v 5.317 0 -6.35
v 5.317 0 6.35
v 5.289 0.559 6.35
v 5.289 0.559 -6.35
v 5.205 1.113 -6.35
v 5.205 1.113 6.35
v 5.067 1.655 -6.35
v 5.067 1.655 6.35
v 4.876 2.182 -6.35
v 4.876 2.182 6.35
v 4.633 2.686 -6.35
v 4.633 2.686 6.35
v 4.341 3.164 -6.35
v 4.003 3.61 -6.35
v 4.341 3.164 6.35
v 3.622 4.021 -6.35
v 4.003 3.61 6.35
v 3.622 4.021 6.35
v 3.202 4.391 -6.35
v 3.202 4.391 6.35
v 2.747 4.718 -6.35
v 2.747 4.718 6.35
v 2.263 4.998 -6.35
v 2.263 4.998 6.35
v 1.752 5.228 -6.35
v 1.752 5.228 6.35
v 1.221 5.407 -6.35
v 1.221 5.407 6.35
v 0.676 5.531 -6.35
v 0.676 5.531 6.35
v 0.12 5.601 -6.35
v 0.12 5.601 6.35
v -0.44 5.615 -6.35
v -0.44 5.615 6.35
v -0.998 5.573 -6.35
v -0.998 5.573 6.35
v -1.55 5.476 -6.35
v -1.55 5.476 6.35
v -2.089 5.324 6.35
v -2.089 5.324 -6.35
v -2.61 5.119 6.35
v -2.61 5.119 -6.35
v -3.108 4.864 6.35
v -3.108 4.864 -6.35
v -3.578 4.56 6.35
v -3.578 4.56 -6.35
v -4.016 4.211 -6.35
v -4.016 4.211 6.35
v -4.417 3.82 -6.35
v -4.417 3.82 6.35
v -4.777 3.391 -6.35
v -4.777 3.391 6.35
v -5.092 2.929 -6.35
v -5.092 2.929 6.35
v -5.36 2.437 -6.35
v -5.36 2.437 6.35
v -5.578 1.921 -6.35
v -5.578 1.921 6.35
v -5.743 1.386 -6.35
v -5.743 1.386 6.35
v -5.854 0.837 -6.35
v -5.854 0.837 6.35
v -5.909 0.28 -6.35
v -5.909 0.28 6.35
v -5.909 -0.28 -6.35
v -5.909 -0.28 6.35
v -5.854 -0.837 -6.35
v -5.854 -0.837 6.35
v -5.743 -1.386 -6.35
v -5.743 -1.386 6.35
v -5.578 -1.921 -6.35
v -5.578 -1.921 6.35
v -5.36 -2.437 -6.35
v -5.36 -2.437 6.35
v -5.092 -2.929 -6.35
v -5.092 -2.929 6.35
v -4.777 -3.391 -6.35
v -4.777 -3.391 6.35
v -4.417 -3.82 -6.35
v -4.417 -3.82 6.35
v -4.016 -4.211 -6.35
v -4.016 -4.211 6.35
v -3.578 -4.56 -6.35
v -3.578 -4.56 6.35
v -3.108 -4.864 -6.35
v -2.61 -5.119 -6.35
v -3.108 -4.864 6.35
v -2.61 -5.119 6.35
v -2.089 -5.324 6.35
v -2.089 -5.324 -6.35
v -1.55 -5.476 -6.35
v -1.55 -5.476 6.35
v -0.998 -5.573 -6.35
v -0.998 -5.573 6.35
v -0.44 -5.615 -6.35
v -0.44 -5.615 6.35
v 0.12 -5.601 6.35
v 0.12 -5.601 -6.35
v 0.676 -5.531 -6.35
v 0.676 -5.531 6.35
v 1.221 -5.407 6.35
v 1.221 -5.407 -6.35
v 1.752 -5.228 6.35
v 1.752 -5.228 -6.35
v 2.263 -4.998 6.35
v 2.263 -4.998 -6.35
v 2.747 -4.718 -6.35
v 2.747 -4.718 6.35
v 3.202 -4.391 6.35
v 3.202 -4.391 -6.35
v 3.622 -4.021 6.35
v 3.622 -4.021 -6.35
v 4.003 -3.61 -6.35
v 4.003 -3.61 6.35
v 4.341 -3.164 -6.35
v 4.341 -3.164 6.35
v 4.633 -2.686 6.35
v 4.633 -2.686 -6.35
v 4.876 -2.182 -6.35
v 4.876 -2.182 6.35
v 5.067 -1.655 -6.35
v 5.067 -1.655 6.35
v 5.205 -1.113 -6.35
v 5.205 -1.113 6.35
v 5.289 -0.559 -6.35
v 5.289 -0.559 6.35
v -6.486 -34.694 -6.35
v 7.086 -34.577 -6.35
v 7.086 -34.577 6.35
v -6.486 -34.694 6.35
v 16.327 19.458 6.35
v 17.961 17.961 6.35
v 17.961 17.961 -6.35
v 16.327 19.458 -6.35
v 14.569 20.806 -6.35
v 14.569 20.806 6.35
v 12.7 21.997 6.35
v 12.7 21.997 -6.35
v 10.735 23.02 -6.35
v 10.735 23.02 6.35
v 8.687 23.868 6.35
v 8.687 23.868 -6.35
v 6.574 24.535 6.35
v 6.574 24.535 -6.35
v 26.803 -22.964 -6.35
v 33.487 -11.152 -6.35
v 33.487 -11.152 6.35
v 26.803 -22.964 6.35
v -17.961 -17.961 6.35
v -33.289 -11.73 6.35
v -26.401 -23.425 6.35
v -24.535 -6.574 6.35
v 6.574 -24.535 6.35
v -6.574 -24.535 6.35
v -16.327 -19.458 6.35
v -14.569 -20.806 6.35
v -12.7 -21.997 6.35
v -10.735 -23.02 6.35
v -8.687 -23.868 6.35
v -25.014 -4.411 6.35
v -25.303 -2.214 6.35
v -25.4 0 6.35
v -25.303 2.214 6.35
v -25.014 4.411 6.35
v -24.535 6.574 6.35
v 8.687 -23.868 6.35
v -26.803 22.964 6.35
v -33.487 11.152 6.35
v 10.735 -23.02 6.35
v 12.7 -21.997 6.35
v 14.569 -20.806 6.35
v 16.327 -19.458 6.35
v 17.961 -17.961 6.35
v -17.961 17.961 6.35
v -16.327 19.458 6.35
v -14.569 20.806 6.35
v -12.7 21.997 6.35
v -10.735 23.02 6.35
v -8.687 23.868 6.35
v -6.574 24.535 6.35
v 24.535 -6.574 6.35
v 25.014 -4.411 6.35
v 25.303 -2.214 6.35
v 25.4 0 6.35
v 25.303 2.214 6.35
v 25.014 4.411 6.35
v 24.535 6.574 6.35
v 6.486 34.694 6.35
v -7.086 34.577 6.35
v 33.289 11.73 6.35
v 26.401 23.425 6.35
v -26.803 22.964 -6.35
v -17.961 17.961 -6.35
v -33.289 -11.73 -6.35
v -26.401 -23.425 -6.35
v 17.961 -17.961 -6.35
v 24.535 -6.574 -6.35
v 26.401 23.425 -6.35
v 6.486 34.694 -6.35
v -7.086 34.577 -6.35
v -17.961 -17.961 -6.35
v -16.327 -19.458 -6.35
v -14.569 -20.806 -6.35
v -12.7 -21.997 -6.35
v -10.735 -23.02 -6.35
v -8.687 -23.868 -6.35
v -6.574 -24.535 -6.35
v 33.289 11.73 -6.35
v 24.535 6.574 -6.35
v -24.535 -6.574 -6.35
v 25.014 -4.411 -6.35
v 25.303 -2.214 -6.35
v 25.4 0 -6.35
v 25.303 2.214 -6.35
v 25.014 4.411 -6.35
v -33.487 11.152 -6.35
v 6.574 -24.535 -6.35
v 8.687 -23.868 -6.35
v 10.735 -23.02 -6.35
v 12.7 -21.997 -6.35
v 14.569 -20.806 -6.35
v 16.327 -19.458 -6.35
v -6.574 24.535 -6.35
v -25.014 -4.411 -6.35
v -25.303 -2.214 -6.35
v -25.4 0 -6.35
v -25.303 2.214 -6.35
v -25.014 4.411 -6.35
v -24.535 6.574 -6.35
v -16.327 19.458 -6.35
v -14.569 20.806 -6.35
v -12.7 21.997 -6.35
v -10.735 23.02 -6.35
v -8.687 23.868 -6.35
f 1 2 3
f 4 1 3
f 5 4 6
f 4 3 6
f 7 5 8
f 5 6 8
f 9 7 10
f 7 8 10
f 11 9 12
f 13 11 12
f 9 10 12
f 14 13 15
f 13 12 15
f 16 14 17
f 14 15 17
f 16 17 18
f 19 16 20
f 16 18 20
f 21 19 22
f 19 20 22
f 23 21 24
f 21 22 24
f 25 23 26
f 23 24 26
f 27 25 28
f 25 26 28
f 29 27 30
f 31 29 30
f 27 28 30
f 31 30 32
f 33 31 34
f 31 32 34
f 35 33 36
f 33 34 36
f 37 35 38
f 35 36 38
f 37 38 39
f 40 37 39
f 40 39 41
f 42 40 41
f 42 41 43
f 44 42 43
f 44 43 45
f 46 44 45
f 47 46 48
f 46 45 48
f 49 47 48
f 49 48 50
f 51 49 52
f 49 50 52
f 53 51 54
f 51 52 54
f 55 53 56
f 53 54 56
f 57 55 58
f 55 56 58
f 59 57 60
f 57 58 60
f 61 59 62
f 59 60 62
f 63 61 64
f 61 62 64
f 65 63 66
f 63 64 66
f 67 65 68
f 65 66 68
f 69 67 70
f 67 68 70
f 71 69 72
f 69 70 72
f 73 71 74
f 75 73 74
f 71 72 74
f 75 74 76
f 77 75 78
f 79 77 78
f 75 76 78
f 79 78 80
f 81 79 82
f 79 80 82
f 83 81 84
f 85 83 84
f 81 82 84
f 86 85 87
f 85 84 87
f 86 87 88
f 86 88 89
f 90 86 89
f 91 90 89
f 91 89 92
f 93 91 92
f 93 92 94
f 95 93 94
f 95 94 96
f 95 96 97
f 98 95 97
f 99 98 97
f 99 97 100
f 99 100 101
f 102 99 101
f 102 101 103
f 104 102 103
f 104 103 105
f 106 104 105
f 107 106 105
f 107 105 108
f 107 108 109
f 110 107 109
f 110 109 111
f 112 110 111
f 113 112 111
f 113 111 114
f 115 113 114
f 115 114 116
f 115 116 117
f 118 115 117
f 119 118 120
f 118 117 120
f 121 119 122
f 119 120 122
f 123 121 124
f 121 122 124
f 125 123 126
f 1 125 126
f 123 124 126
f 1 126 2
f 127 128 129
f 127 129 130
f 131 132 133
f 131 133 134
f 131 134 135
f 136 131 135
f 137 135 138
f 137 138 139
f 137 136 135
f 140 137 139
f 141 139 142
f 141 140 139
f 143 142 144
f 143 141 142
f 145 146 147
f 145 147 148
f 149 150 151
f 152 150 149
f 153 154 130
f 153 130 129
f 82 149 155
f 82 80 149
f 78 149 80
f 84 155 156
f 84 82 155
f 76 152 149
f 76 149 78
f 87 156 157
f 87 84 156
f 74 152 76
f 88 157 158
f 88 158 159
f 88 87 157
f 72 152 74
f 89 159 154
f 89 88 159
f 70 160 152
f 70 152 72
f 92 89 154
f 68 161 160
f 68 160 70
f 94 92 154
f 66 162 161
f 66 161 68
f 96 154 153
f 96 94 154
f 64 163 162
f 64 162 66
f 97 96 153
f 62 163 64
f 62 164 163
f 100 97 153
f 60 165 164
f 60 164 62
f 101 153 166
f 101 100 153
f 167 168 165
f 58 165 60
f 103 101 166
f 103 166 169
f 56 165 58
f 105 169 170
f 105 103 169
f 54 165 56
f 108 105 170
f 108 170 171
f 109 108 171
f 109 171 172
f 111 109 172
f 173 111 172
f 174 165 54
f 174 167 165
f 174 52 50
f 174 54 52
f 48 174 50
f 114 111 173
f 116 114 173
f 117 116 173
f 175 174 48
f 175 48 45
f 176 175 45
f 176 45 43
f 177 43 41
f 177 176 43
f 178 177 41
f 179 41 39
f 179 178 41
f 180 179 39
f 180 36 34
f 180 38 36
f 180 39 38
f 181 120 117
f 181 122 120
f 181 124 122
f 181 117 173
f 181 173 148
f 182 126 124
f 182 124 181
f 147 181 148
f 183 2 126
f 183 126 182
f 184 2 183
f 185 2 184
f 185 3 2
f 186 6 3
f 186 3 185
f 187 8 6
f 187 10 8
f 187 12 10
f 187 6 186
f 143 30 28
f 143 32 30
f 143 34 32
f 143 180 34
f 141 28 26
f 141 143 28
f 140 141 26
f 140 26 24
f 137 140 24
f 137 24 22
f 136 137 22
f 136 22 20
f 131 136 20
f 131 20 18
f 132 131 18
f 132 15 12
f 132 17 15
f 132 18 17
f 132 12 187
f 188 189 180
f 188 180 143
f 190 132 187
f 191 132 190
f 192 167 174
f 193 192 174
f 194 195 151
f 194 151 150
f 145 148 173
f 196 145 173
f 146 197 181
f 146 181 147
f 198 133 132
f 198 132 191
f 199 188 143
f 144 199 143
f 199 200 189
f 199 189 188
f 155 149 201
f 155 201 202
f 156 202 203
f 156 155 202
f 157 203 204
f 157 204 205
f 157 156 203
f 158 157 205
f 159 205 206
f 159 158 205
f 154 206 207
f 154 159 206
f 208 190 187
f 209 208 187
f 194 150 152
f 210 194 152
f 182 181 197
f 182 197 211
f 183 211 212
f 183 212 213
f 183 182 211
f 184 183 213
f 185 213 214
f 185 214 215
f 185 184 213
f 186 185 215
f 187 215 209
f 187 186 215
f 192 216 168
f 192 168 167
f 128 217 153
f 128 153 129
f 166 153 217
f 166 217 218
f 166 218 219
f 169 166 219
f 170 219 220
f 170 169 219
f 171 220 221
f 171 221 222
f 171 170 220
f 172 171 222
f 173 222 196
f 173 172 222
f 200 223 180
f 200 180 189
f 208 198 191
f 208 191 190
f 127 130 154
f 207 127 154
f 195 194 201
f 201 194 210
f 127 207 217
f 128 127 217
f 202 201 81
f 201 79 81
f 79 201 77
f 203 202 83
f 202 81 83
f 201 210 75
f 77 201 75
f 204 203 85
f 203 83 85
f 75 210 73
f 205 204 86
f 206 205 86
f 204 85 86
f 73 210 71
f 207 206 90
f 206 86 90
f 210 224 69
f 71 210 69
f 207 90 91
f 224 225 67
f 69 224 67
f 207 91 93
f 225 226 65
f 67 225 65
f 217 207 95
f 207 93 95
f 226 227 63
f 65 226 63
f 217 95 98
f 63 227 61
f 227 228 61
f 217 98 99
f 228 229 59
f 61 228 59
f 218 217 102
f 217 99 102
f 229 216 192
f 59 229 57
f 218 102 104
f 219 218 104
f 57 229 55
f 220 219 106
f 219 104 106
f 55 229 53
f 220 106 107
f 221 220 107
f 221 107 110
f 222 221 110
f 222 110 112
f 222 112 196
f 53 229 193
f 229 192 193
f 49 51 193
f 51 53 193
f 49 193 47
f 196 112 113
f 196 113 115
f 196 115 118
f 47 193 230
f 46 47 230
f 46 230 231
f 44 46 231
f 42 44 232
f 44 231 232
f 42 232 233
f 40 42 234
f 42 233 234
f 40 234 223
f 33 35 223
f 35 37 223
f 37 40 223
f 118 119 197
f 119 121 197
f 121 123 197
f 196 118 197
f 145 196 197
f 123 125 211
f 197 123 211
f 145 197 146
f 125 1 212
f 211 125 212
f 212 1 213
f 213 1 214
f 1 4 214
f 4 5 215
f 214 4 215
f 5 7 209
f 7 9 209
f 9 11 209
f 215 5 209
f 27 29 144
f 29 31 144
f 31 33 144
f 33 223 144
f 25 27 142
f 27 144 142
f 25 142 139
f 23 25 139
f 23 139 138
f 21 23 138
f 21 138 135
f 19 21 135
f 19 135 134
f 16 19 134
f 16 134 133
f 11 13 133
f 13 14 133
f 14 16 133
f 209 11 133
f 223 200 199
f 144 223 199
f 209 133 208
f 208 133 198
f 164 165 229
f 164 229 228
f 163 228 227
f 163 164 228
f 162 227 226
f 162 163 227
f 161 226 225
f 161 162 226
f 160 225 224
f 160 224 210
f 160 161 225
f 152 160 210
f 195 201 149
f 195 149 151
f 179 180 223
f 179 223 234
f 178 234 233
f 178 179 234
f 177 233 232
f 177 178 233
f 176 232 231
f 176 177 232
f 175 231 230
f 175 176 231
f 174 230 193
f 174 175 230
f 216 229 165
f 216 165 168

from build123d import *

# Parameters (mm, degrees)
F0_R     = 25.4
F1_DEPTH = 6.35
F3_DEPTH = 12.7
F5_COUNT = 6
F6_R     = 5.616515
F7_DEPTH = 12.7


with BuildPart() as f1:
    # F0 (on Top) → F1 (new body, symmetric)
    with BuildSketch(Plane.XY):
        Circle(F0_R)
    extrude(amount=F1_DEPTH, both=True)

    # F2 (on face) → F3 (join)
    with BuildSketch(Plane(origin=(0, 0, -6.35), x_dir=(1, 0, 0), z_dir=(0, 0, -1))):
        with BuildLine():
            Line((-6.574004, 24.534516), (0, 24.477616))
            Line((0, 24.477616), (0, 25.4))
            ThreePointArc((0, 25.4), (-3.315365, 25.182699), (-6.574004, 24.534516))
        make_face()
        with BuildLine():
            Line((0, 25.4), (0, 24.477616))
            Line((0, 24.477616), (6.543582, 24.420979))
            Line((6.543582, 24.420979), (6.574004, 24.534516))
            ThreePointArc((6.574004, 24.534516), (3.315365, 25.182699), (0, 25.4))
        make_face()
        with BuildLine():
            Line((-6.486069, 34.694135), (-6.574004, 24.534516))
            ThreePointArc((-6.574004, 24.534516), (-3.315365, 25.182699), (0, 25.4))
            ThreePointArc((0, 25.4), (3.315365, 25.182699), (6.574004, 24.534516))
            Line((6.574004, 24.534516), (7.085632, 34.576668))
            Line((7.085632, 34.576668), (-6.486069, 34.694135))
        make_face()
    extrude(amount=-F3_DEPTH)

    # F5: F1 ×6 about axis
    f5_axis = Axis((0, 0, 22.241494), (0, 0, 1))


with BuildPart() as f1_1:
    add(f1.part)
    for i in range(1, F5_COUNT):
        add(f1.part.rotate(f5_axis, i * 360 / F5_COUNT))

    # F6 (on face) → F7 (cut)
    with BuildSketch(Plane.XY.offset(6.35)):
        with Locations((-0.299782, 0)):
            Circle(F6_R)
    extrude(amount=-F7_DEPTH, mode=Mode.SUBTRACT)


solid = f1_1.part
